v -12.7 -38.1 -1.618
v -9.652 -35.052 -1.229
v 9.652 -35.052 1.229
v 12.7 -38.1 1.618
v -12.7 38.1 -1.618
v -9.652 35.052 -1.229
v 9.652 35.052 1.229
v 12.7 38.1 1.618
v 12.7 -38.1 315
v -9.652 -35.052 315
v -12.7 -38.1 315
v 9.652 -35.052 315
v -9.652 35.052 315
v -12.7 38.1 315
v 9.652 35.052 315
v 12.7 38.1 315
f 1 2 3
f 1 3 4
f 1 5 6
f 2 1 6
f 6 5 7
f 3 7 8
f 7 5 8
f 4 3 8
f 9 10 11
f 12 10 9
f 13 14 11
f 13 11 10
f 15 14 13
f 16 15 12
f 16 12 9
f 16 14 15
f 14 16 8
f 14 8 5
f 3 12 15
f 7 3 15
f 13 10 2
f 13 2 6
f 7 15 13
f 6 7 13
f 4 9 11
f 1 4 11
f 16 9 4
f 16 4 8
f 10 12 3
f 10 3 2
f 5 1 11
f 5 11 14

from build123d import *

# Parameters (mm, degrees)
SKETCH2_W               = 9.652
SKETCH2_H               = 3.048
SKETCH2_W_2             = 3.048
SKETCH2_H_2             = 35.052
BOSS_EXTRUDE1_DEPTH     = 315
SKETCH3_W               = 25.4
SKETCH3_H               = 76.2
SKETCH3_W_2             = 19.304
SKETCH3_H_2             = 70.104
BOSS_EXTRUDE2_DEPTH     = 50
CUT_EXTRUDE1_DEPTH      = 1
CUT_EXTRUDE1_DEPTH_BACK = 77.2


with BuildPart() as part:
    # Sketch2 → Boss-Extrude1 (new body)
    with BuildSketch(Plane.XY):
        Polygon((-12.7, 0), (-9.652, 0), (-9.652, 35.052), (-9.652, 38.1), (-12.7, 38.1), align=None)
        with Locations((-4.826, 36.576)):
            Rectangle(SKETCH2_W, SKETCH2_H)
        Polygon((0, 38.1), (0, 35.052), (9.652, 35.052), (9.652, 0), (12.7, 0), (12.7, 38.1), align=None)
        with Locations((11.176, -17.526)):
            Rectangle(SKETCH2_W_2, SKETCH2_H_2)
        Polygon((-9.652, -35.052), (-9.652, 0), (-12.7, 0), (-12.7, -38.1), (0, -38.1), (0, -35.052), align=None)
        Polygon((9.652, -35.052), (0, -35.052), (0, -38.1), (12.7, -38.1), (12.7, -35.052), align=None)
    extrude(amount=BOSS_EXTRUDE1_DEPTH)

    # Sketch3 → Boss-Extrude2 (add)
    with BuildSketch(Plane(origin=(0, 0, 0), x_dir=(-1, 0, 0), z_dir=(0, 0, -1))):
        Rectangle(SKETCH3_W, SKETCH3_H)
        Rectangle(SKETCH3_W_2, SKETCH3_H_2, mode=Mode.SUBTRACT)
    extrude(amount=BOSS_EXTRUDE2_DEPTH)

    # Sketch4 → Cut-Extrude1 (cut, two sides)
    with BuildSketch(Plane(origin=(0, 38.1, 0), x_dir=(1, 0, 0), z_dir=(0, 1, 0))) as cut_extrude1_sk:
        Polygon((12.7, 48.301505629), (115.189557491, -14.672106721), (124.098071564, 55.267937569), (-106.281043419, 84.612151011), (-115.189557491, 14.672106721), (-12.7, 1.617644511), (-12.7, 50), (12.7, 50), align=None)
        Polygon((12.7, -1.617644511), (115.189557491, -14.672106721), (12.7, 48.301505629), align=None)
        Polygon((0, 0), (12.7, -1.617644511), (12.7, 48.301505629), (12.534006261, 48.403498707), align=None)
        Polygon((12.534006261, 48.403498707), (12.7, 48.301505629), (12.7, 50), (-12.7, 50), (-12.7, 1.617644511), (0, 0), align=None)
    extrude(amount=CUT_EXTRUDE1_DEPTH, mode=Mode.SUBTRACT)
    extrude(cut_extrude1_sk.sketch, amount=-CUT_EXTRUDE1_DEPTH_BACK, mode=Mode.SUBTRACT)


solid = part.part
